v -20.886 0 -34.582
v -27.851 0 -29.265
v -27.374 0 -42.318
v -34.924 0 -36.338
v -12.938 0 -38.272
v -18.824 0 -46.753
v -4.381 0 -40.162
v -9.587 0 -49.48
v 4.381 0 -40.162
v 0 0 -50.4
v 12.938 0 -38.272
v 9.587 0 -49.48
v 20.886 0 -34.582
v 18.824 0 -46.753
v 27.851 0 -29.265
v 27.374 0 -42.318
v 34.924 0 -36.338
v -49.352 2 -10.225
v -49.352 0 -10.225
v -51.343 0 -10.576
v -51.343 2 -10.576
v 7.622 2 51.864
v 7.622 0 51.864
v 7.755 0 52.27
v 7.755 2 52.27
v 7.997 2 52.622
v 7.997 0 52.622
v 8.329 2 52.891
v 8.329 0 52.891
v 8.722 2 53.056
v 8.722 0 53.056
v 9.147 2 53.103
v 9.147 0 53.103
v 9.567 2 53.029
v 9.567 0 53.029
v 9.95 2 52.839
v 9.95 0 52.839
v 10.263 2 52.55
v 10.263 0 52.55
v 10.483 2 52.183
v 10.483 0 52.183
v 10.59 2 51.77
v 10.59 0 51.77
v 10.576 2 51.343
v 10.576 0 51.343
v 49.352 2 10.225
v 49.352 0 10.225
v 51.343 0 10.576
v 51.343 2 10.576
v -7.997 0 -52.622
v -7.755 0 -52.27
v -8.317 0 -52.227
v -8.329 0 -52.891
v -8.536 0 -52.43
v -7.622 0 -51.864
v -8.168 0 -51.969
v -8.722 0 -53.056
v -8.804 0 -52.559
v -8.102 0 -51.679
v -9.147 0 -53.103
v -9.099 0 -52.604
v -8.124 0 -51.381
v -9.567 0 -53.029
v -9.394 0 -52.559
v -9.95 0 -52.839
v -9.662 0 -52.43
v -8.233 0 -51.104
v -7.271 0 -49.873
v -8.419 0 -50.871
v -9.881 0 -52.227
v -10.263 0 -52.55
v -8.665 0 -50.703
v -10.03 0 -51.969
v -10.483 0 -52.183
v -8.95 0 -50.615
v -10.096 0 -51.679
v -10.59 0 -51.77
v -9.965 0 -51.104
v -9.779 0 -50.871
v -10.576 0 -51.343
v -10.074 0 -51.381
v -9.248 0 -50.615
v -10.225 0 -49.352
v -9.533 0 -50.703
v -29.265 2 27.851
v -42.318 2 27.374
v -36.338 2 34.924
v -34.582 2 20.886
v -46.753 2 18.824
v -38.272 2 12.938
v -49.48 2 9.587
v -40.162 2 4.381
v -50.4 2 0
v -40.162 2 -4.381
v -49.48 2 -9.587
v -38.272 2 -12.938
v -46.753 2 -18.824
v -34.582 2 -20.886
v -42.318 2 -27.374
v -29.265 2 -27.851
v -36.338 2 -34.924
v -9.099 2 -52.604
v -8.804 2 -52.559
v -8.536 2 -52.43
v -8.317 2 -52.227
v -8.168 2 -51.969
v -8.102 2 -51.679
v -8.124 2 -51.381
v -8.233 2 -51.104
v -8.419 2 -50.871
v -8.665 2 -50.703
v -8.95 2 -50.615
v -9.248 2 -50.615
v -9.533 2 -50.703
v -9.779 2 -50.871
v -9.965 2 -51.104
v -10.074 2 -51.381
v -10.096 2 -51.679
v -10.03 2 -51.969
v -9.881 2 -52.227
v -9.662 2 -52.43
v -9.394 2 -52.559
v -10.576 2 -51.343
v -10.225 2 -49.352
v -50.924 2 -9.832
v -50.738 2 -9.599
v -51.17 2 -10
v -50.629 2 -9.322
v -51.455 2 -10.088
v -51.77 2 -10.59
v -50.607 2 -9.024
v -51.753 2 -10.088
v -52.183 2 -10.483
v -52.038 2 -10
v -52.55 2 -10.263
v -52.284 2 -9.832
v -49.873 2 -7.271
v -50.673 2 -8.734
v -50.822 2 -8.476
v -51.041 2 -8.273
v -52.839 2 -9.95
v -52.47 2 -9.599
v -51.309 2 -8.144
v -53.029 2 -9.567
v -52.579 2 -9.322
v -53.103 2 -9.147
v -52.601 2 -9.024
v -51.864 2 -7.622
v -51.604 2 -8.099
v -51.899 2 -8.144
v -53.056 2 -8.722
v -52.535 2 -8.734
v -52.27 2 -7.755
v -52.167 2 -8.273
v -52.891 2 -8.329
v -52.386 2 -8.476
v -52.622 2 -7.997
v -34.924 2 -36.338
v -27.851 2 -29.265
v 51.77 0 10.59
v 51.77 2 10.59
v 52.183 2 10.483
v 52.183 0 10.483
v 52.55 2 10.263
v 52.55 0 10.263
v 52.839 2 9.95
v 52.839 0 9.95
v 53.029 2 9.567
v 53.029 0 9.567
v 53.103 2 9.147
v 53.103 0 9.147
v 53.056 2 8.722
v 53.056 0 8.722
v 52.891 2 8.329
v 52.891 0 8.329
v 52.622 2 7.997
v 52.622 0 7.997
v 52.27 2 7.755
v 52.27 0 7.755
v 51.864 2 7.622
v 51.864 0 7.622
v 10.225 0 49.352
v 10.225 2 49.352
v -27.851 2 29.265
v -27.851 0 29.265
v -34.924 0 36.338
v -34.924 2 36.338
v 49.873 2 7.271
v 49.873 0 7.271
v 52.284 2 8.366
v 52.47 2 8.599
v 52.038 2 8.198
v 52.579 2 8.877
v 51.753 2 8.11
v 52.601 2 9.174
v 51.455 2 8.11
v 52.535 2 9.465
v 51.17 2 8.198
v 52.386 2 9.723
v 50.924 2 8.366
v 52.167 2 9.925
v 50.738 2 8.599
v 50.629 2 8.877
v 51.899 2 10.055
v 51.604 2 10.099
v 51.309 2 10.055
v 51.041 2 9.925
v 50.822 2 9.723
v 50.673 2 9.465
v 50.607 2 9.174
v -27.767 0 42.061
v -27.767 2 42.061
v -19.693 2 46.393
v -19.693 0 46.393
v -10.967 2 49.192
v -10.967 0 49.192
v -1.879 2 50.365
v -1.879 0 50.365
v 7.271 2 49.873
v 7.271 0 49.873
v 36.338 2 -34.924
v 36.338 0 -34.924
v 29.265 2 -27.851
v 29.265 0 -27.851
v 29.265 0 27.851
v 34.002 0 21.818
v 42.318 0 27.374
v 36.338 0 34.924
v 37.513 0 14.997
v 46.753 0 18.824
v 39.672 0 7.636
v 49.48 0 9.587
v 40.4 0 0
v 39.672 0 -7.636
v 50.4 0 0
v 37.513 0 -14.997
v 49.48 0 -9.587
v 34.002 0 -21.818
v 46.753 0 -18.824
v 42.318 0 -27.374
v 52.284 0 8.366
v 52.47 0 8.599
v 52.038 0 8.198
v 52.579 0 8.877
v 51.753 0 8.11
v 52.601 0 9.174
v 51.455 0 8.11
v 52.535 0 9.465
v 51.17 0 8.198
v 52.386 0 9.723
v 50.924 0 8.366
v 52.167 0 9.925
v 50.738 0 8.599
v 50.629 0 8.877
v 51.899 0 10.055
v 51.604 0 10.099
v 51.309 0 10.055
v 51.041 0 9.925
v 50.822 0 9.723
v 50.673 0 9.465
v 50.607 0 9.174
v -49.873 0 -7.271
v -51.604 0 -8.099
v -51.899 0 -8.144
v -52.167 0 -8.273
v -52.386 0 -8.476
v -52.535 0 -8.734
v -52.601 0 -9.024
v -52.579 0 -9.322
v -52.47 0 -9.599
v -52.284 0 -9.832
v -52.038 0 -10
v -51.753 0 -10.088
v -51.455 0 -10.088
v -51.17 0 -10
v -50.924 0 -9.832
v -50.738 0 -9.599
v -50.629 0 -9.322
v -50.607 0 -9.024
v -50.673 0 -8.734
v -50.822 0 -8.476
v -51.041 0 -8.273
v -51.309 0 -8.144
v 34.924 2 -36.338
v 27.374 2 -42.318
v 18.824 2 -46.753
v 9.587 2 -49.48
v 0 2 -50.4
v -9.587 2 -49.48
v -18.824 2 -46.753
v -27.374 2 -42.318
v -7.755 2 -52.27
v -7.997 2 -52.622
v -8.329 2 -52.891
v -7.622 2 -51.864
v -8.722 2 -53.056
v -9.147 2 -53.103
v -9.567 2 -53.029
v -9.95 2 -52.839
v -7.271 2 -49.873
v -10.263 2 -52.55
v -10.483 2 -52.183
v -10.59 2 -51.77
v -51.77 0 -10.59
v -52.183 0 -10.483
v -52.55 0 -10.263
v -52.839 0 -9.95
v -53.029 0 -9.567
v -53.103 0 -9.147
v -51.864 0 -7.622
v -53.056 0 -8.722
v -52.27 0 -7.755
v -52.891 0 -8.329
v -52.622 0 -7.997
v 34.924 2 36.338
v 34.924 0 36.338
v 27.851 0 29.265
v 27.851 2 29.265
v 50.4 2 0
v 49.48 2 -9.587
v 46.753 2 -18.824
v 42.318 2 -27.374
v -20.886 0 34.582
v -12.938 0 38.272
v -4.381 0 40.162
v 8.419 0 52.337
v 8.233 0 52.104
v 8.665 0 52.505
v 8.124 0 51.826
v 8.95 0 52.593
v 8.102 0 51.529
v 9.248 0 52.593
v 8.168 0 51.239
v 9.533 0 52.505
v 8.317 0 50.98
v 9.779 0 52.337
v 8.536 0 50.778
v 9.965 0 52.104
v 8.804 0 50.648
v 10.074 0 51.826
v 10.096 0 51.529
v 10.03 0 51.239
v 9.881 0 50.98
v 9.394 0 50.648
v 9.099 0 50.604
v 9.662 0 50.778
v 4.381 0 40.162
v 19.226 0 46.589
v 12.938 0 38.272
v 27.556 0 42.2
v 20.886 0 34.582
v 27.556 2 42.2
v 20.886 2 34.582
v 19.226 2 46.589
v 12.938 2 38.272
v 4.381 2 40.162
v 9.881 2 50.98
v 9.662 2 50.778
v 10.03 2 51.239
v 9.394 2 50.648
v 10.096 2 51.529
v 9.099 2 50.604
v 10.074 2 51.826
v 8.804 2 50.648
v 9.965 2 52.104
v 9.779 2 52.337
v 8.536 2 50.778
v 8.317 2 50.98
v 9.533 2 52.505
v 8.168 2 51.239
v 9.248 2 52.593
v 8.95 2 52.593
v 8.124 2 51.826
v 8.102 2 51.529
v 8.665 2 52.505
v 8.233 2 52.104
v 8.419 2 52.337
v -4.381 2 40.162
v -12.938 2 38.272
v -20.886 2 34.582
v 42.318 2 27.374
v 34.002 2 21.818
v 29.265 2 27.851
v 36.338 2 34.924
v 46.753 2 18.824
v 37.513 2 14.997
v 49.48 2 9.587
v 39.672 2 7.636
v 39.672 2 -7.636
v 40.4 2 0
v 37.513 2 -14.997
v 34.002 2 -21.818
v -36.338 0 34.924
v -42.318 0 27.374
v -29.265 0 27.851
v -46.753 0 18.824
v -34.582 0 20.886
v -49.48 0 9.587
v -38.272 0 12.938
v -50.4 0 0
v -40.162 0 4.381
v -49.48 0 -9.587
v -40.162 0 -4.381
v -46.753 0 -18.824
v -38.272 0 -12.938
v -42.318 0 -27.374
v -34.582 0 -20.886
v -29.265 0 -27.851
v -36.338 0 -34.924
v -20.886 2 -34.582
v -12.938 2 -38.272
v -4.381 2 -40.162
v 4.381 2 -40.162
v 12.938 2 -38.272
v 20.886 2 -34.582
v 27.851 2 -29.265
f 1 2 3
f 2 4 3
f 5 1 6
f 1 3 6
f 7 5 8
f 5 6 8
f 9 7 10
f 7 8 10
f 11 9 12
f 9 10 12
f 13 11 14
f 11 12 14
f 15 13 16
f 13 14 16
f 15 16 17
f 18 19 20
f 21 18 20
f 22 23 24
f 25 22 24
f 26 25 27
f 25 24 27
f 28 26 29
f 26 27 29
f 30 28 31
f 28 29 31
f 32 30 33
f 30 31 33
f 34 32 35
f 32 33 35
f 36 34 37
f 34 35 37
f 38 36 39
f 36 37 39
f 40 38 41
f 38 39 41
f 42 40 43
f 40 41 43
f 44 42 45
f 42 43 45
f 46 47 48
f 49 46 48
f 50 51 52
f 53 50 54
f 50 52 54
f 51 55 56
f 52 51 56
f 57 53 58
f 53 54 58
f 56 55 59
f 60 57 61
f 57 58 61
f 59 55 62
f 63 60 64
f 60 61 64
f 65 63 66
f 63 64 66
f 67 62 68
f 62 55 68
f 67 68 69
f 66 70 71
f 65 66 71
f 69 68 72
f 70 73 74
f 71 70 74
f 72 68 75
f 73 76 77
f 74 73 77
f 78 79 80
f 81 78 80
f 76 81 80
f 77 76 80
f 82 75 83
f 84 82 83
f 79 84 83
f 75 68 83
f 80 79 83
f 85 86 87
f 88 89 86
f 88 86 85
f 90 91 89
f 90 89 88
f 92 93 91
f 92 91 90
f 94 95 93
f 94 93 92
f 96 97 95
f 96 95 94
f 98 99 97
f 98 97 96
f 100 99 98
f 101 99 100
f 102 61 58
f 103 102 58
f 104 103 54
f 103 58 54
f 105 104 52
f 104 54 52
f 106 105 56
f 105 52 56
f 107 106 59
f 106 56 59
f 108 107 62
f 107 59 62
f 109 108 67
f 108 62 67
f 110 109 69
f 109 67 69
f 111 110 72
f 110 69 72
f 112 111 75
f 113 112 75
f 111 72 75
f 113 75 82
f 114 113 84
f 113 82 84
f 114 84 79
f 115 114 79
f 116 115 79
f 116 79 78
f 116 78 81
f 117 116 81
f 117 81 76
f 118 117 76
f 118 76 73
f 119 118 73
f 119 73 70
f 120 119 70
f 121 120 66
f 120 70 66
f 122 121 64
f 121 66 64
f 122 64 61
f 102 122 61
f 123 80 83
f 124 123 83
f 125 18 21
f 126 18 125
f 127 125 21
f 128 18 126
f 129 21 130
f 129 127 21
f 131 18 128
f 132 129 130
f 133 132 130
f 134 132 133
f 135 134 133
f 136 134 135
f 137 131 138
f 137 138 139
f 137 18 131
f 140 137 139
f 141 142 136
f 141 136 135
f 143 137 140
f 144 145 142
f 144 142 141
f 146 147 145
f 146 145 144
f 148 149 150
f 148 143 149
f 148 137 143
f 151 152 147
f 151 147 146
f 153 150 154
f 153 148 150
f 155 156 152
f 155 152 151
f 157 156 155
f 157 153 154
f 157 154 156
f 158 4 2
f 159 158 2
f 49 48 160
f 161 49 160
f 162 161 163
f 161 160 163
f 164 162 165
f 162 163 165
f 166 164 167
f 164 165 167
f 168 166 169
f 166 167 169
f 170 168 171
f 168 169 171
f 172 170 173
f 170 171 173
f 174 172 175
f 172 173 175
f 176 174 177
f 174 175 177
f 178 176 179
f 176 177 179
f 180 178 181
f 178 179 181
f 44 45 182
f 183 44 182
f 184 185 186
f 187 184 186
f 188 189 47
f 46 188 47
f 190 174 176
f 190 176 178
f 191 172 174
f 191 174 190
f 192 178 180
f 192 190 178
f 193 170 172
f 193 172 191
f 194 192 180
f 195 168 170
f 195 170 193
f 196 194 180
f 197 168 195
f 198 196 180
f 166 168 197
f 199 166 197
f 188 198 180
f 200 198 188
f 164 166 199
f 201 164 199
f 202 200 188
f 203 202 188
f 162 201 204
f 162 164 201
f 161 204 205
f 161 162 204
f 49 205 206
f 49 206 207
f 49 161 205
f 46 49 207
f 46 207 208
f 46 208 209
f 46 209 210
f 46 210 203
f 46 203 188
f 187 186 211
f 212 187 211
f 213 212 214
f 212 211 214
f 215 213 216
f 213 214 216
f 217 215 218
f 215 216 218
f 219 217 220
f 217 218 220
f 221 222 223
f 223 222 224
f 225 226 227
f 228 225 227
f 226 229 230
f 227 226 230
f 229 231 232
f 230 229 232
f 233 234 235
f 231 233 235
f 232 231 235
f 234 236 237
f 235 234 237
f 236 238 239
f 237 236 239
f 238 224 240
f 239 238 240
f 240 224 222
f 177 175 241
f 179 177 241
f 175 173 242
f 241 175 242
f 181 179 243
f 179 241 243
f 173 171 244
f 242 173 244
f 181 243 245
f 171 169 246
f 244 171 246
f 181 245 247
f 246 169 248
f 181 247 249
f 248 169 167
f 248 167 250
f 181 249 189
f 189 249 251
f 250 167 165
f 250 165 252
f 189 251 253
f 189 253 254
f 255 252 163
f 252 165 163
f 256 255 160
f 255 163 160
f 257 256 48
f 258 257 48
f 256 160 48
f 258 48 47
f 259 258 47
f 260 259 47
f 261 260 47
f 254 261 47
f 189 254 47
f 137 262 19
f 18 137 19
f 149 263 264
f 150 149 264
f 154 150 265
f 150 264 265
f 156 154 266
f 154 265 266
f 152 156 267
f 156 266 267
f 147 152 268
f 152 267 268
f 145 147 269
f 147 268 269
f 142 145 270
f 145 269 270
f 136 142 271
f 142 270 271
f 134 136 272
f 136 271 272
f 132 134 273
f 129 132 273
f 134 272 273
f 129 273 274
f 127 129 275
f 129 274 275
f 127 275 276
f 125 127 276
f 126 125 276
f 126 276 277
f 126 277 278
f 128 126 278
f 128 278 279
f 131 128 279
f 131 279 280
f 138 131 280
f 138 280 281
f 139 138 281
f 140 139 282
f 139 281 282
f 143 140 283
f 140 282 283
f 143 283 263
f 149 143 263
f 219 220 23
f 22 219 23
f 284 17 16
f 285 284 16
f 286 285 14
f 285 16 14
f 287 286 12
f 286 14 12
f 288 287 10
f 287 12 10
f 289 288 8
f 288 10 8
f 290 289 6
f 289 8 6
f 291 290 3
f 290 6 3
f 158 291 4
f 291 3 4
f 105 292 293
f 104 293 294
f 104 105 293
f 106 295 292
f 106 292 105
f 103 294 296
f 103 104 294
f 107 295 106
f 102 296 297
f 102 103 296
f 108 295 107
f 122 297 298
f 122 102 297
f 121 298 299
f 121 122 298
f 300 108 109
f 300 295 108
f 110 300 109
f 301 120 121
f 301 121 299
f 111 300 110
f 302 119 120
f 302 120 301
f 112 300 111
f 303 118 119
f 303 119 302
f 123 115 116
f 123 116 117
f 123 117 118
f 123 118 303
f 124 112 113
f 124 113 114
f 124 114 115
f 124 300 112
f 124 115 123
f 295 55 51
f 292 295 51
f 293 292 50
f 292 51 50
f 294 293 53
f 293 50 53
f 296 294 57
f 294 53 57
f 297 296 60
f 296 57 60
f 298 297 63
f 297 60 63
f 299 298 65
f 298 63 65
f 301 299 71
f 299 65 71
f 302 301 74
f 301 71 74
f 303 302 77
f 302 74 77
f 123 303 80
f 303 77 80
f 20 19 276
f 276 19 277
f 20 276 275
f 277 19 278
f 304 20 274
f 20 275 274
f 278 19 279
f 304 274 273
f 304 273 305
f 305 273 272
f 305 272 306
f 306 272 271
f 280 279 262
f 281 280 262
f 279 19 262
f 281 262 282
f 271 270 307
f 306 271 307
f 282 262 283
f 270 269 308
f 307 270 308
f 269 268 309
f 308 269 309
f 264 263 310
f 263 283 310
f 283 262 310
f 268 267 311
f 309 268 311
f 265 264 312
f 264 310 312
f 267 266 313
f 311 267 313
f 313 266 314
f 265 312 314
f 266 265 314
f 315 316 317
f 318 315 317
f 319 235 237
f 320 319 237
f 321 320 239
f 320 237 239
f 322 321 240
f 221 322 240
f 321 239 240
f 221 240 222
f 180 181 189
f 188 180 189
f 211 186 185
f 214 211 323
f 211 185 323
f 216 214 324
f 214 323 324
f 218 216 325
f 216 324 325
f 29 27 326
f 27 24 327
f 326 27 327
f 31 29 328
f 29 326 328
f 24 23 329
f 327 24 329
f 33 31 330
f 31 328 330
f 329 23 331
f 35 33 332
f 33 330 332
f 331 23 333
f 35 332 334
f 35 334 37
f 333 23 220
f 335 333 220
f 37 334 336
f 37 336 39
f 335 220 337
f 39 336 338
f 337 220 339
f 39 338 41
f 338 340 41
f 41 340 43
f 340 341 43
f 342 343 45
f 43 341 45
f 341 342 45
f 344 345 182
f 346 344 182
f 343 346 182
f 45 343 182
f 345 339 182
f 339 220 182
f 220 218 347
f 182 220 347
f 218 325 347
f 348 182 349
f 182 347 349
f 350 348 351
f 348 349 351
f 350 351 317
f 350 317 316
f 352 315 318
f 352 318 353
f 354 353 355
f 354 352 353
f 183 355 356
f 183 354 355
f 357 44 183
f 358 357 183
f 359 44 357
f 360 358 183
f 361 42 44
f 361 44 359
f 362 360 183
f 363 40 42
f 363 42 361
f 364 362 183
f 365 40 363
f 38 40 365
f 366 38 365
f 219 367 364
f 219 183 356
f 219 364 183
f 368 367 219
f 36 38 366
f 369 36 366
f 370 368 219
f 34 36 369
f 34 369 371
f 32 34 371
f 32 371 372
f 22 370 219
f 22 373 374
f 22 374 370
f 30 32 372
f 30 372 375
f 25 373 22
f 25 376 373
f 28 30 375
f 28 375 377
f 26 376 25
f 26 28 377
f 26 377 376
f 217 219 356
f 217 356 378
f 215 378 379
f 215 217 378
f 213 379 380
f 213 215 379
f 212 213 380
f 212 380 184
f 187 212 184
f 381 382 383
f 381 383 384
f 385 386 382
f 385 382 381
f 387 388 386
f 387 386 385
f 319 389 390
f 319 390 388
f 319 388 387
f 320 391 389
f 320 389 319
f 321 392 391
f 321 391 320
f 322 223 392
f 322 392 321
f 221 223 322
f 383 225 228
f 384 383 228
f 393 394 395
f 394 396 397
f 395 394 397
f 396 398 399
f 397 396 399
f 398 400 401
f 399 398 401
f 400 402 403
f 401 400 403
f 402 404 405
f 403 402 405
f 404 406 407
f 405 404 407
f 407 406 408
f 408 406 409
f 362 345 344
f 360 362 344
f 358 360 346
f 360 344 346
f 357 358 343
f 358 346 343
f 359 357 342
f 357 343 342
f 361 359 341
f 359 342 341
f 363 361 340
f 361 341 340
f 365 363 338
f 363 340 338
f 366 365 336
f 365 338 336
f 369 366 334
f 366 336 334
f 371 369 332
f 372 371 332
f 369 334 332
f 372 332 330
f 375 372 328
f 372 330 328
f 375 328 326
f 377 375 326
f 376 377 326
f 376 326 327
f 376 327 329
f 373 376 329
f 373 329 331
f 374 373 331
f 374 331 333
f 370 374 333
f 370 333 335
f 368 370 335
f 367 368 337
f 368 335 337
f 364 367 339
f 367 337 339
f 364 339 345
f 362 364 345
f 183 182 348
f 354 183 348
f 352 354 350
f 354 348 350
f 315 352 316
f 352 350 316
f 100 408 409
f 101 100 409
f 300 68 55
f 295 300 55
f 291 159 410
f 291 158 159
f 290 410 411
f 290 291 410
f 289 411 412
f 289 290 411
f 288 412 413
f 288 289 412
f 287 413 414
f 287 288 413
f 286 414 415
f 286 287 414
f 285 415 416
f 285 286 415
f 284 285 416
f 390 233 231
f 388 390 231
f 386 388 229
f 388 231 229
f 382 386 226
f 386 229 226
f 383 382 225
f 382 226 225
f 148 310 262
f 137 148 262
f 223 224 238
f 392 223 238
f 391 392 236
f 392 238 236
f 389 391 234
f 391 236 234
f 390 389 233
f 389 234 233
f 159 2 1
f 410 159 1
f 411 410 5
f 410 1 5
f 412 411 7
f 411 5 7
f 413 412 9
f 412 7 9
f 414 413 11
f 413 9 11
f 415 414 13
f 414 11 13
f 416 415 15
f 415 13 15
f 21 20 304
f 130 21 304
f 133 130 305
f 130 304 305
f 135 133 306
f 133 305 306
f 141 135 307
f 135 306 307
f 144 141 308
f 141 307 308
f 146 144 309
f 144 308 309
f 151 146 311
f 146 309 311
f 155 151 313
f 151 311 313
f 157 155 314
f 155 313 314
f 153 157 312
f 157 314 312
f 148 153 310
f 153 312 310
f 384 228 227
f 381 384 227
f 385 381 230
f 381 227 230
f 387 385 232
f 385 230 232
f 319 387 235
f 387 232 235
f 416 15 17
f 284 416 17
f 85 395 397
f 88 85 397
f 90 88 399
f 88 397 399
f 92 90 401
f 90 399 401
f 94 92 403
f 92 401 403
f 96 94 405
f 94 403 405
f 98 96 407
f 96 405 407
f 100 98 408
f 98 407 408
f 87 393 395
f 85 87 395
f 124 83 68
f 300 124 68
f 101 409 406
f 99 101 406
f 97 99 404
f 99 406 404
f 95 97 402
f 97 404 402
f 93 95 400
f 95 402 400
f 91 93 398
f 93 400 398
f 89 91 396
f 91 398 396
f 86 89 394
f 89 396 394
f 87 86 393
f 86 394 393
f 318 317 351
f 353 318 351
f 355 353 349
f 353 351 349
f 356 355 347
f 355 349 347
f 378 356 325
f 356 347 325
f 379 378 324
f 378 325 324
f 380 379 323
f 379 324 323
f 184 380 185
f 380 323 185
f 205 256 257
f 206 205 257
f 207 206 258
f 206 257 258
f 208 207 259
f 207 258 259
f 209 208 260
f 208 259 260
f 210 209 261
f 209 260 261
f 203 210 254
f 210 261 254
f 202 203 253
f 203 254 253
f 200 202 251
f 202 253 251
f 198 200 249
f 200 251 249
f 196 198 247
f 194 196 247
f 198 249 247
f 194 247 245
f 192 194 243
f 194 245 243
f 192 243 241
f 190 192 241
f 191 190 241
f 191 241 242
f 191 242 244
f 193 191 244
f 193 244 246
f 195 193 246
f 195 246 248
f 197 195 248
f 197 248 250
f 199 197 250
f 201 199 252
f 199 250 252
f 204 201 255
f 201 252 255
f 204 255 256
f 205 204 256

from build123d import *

# Parameters (mm, degrees)
EXTRUDE_1_DEPTH   = 2
EXTRUDE_1_2_DEPTH = 2
EXTRUDE_1_3_DEPTH = 2
EXTRUDE_1_4_DEPTH = 2
SKETCH_2_R        = 1
EXTRUDE_2_DEPTH   = 2


with BuildPart() as part:
    # 草图1 → 凸台-拉伸1 (new body)
    with BuildSketch(Plane(origin=(0, 0, 0), x_dir=(1, 0, 0), z_dir=(0, 1, 0))):
        with BuildLine():
            Line((-36.338272914, -34.924059352), (-29.265468079, -27.851254516))
            ThreePointArc((-29.265468079, -27.851254516), (-40.4, 0), (-29.265468079, 27.851254516))
            Line((-29.265468079, 27.851254516), (-36.338272914, 34.924059352))
            ThreePointArc((-36.338272914, 34.924059352), (-50.4, 0), (-36.338272914, -34.924059352))
        make_face()
    extrude(amount=EXTRUDE_1_DEPTH)


with BuildPart() as body_2:
    # 草图1 → Extrude 1 2 (new body)
    with BuildSketch(Plane(origin=(0, 0, 0), x_dir=(1, 0, 0), z_dir=(0, 1, 0))):
        with BuildLine():
            ThreePointArc((-27.851254516, 29.265468079), (0, 40.4), (27.851254516, 29.265468079))
            Line((27.851254516, 29.265468079), (34.924059352, 36.338272914))
            ThreePointArc((34.924059352, 36.338272914), (0, 50.4), (-34.924059352, 36.338272914))
            Line((-34.924059352, 36.338272914), (-27.851254516, 29.265468079))
        make_face()
    extrude(amount=EXTRUDE_1_2_DEPTH)


with BuildPart() as body_3:
    # 草图1 → Extrude 1 3 (new body)
    with BuildSketch(Plane(origin=(0, 0, 0), x_dir=(1, 0, 0), z_dir=(0, 1, 0))):
        with BuildLine():
            Line((36.338272914, 34.924059352), (29.265468079, 27.851254516))
            ThreePointArc((29.265468079, 27.851254516), (37.513230402, 14.997251242), (40.4, 0))
            ThreePointArc((40.4, 0), (37.513230402, -14.997251242), (29.265468079, -27.851254516))
            Line((29.265468079, -27.851254516), (36.338272914, -34.924059352))
            ThreePointArc((36.338272914, -34.924059352), (46.752587922, -18.824333257), (50.4, 0))
            ThreePointArc((50.4, 0), (46.752587922, 18.824333257), (36.338272914, 34.924059352))
        make_face()
    extrude(amount=EXTRUDE_1_3_DEPTH)


with BuildPart() as body_4:
    # 草图1 → Extrude 1 4 (new body)
    with BuildSketch(Plane(origin=(0, 0, 0), x_dir=(1, 0, 0), z_dir=(0, 1, 0))):
        with BuildLine():
            Line((34.924059352, -36.338272914), (27.851254516, -29.265468079))
            ThreePointArc((27.851254516, -29.265468079), (0, -40.4), (-27.851254516, -29.265468079))
            Line((-27.851254516, -29.265468079), (-34.924059352, -36.338272914))
            ThreePointArc((-34.924059352, -36.338272914), (0, -50.4), (34.924059352, -36.338272914))
        make_face()
    extrude(amount=EXTRUDE_1_4_DEPTH)

    # 草图2 → 凸台-拉伸2 (add)
    # profile 1 of 4: a face of its own
    with BuildSketch(Plane.XZ):
        with BuildLine():
            Line((10.22520285, 49.351851299), (7.270779591, 49.872795832))
            Line((7.270779591, 49.872795832), (7.62195288, 51.864398524))
            ThreePointArc((7.62195288, 51.864398524), (9.359636776, 53.081137887), (10.576376139, 51.343453991))
            Line((10.576376139, 51.343453991), (10.22520285, 49.351851299))
        make_face()
        with Locations(Location((9.09916451, 51.603926258, 0), (0, 0, 270))):
            Circle(SKETCH_2_R, mode=Mode.SUBTRACT)
    # profile 2 of 4: a face of its own
    with BuildSketch(Plane.XZ):
        with BuildLine():
            Line((49.351851299, 10.22520285), (51.343453991, 10.576376139))
            ThreePointArc((51.343453991, 10.576376139), (53.081137887, 9.359636776), (51.864398524, 7.62195288))
            Line((51.864398524, 7.62195288), (49.872795832, 7.270779591))
            Line((49.872795832, 7.270779591), (49.351851299, 10.22520285))
        make_face()
        with Locations(Location((51.603926258, 9.09916451, 0), (0, 0, 90))):
            Circle(SKETCH_2_R, mode=Mode.SUBTRACT)
    # profile 3 of 4: a face of its own
    with BuildSketch(Plane.XZ):
        with BuildLine():
            Line((-49.351851299, -10.22520285), (-51.343453991, -10.576376139))
            ThreePointArc((-51.343453991, -10.576376139), (-53.081137887, -9.359636776), (-51.864398524, -7.62195288))
            Line((-51.864398524, -7.62195288), (-49.872795832, -7.270779591))
            Line((-49.872795832, -7.270779591), (-49.351851299, -10.22520285))
        make_face()
        with Locations(Location((-51.603926258, -9.09916451, 0), (0, 0, 90))):
            Circle(SKETCH_2_R, mode=Mode.SUBTRACT)
    # profile 4 of 4: a face of its own
    with BuildSketch(Plane.XZ):
        with BuildLine():
            Line((-10.22520285, -49.351851299), (-7.270779591, -49.872795832))
            Line((-7.270779591, -49.872795832), (-7.62195288, -51.864398524))
            ThreePointArc((-7.62195288, -51.864398524), (-9.359636776, -53.081137887), (-10.576376139, -51.343453991))
            Line((-10.576376139, -51.343453991), (-10.22520285, -49.351851299))
        make_face()
        with Locations(Location((-9.09916451, -51.603926258, 0), (0, 0, 270))):
            Circle(SKETCH_2_R, mode=Mode.SUBTRACT)
    extrude(amount=-EXTRUDE_2_DEPTH)


with BuildPart() as extrude_2_piece_1:
    # of the separate pieces the step leaves, piece 1, a body of its own (extrude_2_pieces)
    add(body_4.part.solids().sort_by_distance((34.924059352, 0, 36.338272914))[0])


with BuildPart() as extrude_2_piece_2:
    # of the separate pieces the step leaves, piece 2, a body of its own (extrude_2_pieces)
    add(body_4.part.solids().sort_by_distance((-10.576376139, 0, -51.343453991))[0])


with BuildPart() as extrude_2_piece_3:
    # of the separate pieces the step leaves, piece 3, a body of its own (extrude_2_pieces)
    add(body_4.part.solids().sort_by_distance((49.351851299, 0, 10.22520285))[0])


with BuildPart() as extrude_2_piece_4:
    # of the separate pieces the step leaves, piece 4, a body of its own (extrude_2_pieces)
    add(body_4.part.solids().sort_by_distance((-51.864398524, 0, -7.62195288))[0])


solid = Compound([part.part, body_2.part, body_3.part, extrude_2_piece_1.part, extrude_2_piece_2.part, extrude_2_piece_3.part, extrude_2_piece_4.part])
